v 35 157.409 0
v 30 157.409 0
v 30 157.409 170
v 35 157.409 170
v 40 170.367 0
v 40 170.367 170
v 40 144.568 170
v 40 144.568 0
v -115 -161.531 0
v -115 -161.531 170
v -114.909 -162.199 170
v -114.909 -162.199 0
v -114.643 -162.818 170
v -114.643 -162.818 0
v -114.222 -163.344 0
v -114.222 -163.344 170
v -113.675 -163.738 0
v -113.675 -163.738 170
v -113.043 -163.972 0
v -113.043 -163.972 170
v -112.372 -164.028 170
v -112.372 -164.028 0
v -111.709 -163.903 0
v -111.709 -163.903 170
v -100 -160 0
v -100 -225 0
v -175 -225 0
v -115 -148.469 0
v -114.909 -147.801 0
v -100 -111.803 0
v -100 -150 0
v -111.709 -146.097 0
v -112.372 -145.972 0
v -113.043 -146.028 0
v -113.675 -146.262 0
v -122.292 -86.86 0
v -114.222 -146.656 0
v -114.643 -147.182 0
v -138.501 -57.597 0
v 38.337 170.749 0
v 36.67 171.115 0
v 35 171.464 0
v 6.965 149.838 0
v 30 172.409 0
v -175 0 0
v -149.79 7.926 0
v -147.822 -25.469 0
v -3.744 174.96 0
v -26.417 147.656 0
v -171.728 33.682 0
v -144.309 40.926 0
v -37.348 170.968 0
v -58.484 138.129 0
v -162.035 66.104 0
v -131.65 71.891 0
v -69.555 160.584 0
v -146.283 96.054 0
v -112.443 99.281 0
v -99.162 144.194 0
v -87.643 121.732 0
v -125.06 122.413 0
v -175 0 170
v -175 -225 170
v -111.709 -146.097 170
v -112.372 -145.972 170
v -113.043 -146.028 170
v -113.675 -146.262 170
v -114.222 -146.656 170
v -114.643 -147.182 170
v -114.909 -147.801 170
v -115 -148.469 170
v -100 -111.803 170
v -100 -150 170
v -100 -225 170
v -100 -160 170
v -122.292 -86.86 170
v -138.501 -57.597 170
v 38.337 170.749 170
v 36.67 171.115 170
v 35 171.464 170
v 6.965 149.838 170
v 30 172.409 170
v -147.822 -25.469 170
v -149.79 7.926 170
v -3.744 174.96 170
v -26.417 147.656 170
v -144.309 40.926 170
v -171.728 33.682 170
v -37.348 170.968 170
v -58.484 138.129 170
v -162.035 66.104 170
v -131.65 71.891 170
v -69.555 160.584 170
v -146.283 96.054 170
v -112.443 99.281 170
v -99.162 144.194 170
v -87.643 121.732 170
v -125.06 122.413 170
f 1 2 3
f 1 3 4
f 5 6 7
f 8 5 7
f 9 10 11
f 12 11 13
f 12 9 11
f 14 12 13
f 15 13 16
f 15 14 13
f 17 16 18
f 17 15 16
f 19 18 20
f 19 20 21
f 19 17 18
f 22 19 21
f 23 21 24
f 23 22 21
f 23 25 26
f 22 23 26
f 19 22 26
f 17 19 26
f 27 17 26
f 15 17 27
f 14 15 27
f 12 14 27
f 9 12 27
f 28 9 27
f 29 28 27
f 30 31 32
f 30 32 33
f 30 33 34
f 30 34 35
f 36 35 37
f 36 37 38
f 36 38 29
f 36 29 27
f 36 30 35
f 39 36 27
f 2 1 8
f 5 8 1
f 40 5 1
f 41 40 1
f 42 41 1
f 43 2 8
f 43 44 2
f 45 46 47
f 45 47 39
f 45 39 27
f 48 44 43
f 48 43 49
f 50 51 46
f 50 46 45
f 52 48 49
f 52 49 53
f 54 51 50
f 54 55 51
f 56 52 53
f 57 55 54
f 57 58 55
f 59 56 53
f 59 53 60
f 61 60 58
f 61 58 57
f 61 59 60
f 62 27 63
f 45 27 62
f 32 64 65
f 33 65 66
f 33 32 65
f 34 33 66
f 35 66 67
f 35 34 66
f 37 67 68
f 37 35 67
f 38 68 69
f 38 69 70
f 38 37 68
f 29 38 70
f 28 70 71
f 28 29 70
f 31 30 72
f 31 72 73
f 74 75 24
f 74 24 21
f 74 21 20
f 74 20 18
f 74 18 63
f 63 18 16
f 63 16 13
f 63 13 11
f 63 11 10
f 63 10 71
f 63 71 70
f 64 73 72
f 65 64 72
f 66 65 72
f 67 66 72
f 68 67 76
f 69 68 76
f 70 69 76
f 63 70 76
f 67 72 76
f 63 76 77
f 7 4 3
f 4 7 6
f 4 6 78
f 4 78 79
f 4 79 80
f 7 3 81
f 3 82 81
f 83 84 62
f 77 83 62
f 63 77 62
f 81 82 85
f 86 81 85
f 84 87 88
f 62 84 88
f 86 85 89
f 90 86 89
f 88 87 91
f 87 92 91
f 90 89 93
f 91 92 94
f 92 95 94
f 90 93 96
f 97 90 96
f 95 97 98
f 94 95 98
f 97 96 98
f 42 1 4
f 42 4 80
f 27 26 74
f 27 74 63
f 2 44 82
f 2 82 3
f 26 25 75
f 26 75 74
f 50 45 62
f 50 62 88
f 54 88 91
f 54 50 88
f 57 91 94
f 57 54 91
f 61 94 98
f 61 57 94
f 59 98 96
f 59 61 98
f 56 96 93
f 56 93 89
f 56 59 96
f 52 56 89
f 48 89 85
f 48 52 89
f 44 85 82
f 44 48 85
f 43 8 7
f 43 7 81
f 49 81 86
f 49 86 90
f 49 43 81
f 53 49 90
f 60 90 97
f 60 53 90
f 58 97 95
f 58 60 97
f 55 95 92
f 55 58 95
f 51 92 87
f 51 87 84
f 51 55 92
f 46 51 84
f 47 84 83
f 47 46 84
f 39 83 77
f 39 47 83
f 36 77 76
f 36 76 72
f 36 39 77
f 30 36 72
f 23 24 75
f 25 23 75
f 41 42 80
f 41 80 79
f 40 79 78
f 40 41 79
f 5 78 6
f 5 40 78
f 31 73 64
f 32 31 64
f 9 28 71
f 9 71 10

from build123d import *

# Parameters (mm, degrees)
INNER_RING_LEFT_SIDE_DEPTH = 170


with BuildPart() as part:
    # Sketch1 → Inner Ring - Left Side (new body)
    with BuildSketch(Plane.XY):
        with BuildLine():
            Line((-100, -111.803398875), (-100, -150))
            Line((-100, -150), (-111.709430585, -146.096856472))
            ThreePointArc((-111.709430585, -146.096856472), (-113.961775712, -146.440459254), (-115, -148.468564717))
            Line((-115, -148.468564717), (-115, -161.531435283))
            ThreePointArc((-115, -161.531435283), (-113.961775712, -163.559540746), (-111.709430585, -163.903143528))
            Line((-111.709430585, -163.903143528), (-100, -160))
            Line((-100, -160), (-100, -225))
            Line((-100, -225), (-175, -225))
            Line((-175, -225), (-175, 0))
            ThreePointArc((-175, 0), (-112.638803261, 133.93095236), (30, 172.409396496))
            Line((30, 172.409396496), (30, 157.409396496))
            Line((30, 157.409396496), (35, 157.409396496))
            Line((35, 157.409396496), (35, 171.464281995))
            ThreePointArc((35, 171.464281995), (37.50401138, 170.934049067), (40, 170.367250374))
            Line((40, 170.367250374), (40, 144.568322948))
            ThreePointArc((40, 144.568322948), (-131.649591483, 71.891481153), (-100, -111.803398875))
        make_face()
    extrude(amount=INNER_RING_LEFT_SIDE_DEPTH)


solid = part.part
